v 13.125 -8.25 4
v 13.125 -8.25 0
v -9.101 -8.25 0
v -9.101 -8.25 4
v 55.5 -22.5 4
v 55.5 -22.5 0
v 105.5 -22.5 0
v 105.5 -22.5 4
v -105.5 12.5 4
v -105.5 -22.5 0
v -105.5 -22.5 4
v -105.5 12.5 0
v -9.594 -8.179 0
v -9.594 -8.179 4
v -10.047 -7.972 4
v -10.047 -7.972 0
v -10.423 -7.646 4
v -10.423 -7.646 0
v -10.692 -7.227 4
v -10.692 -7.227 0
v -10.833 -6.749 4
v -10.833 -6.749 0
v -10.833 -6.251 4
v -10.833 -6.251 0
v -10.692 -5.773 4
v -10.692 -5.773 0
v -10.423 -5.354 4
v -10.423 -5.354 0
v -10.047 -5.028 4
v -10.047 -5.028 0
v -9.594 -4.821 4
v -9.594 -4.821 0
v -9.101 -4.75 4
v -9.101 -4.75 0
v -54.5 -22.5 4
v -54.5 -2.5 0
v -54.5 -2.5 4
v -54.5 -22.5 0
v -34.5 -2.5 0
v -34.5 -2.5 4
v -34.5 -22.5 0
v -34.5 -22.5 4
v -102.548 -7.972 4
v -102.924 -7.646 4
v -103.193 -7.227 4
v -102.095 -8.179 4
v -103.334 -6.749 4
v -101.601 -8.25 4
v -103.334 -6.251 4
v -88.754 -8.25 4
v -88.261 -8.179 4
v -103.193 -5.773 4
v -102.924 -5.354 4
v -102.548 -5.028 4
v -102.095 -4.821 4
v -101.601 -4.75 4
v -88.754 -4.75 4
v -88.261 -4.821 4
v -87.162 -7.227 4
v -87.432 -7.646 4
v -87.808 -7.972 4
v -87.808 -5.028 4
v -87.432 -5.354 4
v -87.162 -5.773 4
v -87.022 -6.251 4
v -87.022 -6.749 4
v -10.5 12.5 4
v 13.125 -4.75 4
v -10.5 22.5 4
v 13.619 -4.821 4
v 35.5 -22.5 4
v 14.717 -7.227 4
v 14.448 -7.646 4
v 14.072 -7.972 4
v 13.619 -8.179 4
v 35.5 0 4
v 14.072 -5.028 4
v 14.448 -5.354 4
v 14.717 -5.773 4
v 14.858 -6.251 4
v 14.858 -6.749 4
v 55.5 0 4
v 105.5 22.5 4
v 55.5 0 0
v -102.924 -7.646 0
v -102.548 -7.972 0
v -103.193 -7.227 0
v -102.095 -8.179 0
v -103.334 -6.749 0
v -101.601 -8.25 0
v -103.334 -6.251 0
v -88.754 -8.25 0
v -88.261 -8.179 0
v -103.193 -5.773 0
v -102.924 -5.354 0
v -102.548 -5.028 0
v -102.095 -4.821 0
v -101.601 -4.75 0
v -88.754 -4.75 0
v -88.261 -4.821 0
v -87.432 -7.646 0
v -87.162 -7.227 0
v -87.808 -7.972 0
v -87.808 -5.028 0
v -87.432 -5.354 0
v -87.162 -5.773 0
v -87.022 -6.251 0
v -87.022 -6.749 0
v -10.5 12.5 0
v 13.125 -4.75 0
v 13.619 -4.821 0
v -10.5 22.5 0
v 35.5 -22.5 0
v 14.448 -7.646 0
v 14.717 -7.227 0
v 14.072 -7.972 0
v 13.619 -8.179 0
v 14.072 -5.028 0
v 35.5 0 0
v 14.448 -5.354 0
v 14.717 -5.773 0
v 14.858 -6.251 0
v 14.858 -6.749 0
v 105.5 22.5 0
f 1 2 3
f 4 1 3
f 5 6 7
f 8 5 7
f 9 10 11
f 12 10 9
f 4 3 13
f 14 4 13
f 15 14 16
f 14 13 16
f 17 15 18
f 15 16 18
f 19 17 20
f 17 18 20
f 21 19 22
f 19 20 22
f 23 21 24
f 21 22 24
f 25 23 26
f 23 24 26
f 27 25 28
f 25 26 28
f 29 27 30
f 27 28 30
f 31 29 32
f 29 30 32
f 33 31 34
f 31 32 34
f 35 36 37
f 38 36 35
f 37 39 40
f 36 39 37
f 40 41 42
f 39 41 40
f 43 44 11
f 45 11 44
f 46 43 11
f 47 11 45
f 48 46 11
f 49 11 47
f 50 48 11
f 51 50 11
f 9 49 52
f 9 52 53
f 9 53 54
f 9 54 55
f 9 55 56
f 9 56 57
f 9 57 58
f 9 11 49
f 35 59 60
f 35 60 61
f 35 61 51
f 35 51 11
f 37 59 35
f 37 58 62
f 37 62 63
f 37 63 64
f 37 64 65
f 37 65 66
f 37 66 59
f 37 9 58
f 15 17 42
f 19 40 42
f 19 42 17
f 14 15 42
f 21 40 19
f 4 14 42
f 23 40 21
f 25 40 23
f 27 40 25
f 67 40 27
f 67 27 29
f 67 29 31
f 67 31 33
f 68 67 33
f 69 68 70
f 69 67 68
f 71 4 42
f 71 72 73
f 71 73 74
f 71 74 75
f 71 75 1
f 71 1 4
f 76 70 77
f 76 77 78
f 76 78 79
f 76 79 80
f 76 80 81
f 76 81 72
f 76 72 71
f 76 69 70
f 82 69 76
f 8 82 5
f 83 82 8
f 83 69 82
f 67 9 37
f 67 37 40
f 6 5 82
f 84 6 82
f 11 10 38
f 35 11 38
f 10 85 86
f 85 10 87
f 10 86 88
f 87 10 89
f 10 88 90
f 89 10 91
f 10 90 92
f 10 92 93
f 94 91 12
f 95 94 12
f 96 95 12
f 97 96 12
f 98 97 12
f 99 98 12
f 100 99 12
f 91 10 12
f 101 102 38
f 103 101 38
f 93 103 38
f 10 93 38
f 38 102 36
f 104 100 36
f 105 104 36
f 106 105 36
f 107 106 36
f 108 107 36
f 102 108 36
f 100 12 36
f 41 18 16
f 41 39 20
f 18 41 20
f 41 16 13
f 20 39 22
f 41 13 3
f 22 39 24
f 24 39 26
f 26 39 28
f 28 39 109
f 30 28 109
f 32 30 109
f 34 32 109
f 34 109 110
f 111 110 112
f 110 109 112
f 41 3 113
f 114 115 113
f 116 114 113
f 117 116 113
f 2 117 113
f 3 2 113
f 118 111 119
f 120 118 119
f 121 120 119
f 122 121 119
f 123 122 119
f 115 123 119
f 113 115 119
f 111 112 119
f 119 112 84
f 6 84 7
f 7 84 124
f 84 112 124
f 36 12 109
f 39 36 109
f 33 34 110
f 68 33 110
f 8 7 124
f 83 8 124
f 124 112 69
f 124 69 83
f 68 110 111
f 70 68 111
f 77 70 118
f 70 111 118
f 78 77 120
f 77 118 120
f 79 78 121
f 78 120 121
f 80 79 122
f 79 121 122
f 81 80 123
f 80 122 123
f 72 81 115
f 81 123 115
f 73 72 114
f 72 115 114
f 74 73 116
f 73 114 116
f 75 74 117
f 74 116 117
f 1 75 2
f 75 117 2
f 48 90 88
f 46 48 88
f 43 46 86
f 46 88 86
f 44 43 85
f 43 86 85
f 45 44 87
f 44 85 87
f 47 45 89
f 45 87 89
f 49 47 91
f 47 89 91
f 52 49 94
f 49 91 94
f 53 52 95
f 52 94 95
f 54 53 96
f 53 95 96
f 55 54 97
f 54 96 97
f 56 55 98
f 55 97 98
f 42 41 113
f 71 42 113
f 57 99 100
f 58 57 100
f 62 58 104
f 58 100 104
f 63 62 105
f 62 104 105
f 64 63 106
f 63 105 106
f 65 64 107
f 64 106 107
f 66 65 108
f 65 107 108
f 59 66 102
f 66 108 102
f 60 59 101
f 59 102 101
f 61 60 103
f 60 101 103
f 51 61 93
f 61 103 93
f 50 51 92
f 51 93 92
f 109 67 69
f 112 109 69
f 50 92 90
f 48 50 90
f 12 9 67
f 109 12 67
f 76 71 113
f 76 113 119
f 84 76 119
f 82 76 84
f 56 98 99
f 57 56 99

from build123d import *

# Parameters (mm, degrees)
SKETCH1_W           = 211
SKETCH1_H           = 45
BOSS_EXTRUDE1_DEPTH = 4
CUT_EXTRUDE1_REACH  = 109.947
SKETCH2_W           = 95
SKETCH2_H           = 10
CUT_EXTRUDE2_REACH  = 109.947
SKETCH3_R           = 4.5
SKETCH3_W           = 20
SKETCH3_H           = 22.5
CUT_EXTRUDE3_DEPTH  = 4
CUT_EXTRUDE4_DEPTH  = 4
SKETCH7_R           = 5.771912947
CUT_EXTRUDE6_DEPTH  = 108.94674613
CUT_EXTRUDE7_REACH  = 109.947


with BuildPart() as part:
    # Sketch1 → Boss-Extrude1 (new body)
    with BuildSketch(Plane.XY):
        Rectangle(SKETCH1_W, SKETCH1_H)
    extrude(amount=BOSS_EXTRUDE1_DEPTH)

    # Sketch2 → Cut-Extrude1 (cut, up to next)
    with BuildSketch(Plane.XY.offset(4), mode=Mode.PRIVATE) as cut_extrude1_sk1:
        with Locations((-58, 17.5)):
            Rectangle(SKETCH2_W, SKETCH2_H)
    cut_extrude1_tool1 = extrude(cut_extrude1_sk1.sketch, amount=-CUT_EXTRUDE1_REACH, mode=Mode.PRIVATE) & part.part
    add(cut_extrude1_tool1.solids().sort_by_distance((-58, 17.5, 4))[0], mode=Mode.SUBTRACT)

    # Sketch3 → Cut-Extrude2 (cut, up to next)
    with BuildSketch(Plane.XY.offset(4), mode=Mode.PRIVATE) as cut_extrude2_sk1:
        with Locations((-44.5, -10.5)):
            Circle(SKETCH3_R)
    cut_extrude2_tool1 = extrude(cut_extrude2_sk1.sketch, amount=-CUT_EXTRUDE2_REACH, mode=Mode.PRIVATE) & part.part
    # Sketch3 → Cut-Extrude2 (cut, up to next)
    with BuildSketch(Plane.XY.offset(4), mode=Mode.PRIVATE) as cut_extrude2_sk2:
        with Locations((45.5, -11.25)):
            Rectangle(SKETCH3_W, SKETCH3_H)
        with Locations((45.5, -10.5)):
            Circle(SKETCH3_R, mode=Mode.SUBTRACT)
    cut_extrude2_tool2 = extrude(cut_extrude2_sk2.sketch, amount=-CUT_EXTRUDE2_REACH, mode=Mode.PRIVATE) & part.part
    add(cut_extrude2_tool1.solids().sort_by_distance((-44.5, -10.5, 4))[0], mode=Mode.SUBTRACT)
    add(cut_extrude2_tool2.solids().sort_by_distance((55.19896, -11.25, 4))[0], mode=Mode.SUBTRACT)


with BuildPart() as cut_extrude2_piece_1:
    # of the separate pieces the step leaves, piece 1, a body of its own (cut_extrude2_pieces)
    add(part.part.solids().sort_by_distance((-105.5, -22.5, 0))[0])

    # Sketch4 → Cut-Extrude3 (cut)
    with BuildSketch(Plane(origin=(0, 0, 0), x_dir=(-1, 0, 0), z_dir=(0, 0, -1))):
        Polygon((44.5, -22.5), (34.5, -22.5), (34.5, -2.5), (54.5, -2.5), (54.5, -22.5), align=None)
    extrude(amount=-CUT_EXTRUDE3_DEPTH, mode=Mode.SUBTRACT)

    # Sketch5 → Cut-Extrude4 (cut)
    with BuildSketch(Plane(origin=(0, 0, 0), x_dir=(-1, 0, 0), z_dir=(0, 0, -1))):
        with BuildLine():
            Line((101.601478709, -4.75), (88.754183798, -4.75))
            ThreePointArc((88.754183798, -4.75), (87.004183798, -6.5), (88.754183798, -8.25))
            Line((88.754183798, -8.25), (101.601478709, -8.25))
            ThreePointArc((101.601478709, -8.25), (103.351478709, -6.5), (101.601478709, -4.75))
        make_face()
    extrude(amount=-CUT_EXTRUDE4_DEPTH, mode=Mode.SUBTRACT)

    # Sketch8 → Cut-Extrude7 (cut, up to next)
    with BuildSketch(Plane(origin=(0, 0, 0), x_dir=(-1, 0, 0), z_dir=(0, 0, -1)), mode=Mode.PRIVATE) as cut_extrude7_sk1:
        with BuildLine():
            Line((-13.125491326, -8.25), (9.100552063, -8.25))
            ThreePointArc((9.100552063, -8.25), (10.850552063, -6.5), (9.100552063, -4.75))
            Line((9.100552063, -4.75), (-3.792824267, -4.75))
            Line((-3.792824267, -4.75), (-13.125491326, -4.75))
            ThreePointArc((-13.125491326, -4.75), (-14.875491326, -6.5), (-13.125491326, -8.25))
        make_face()
    cut_extrude7_tool1 = extrude(cut_extrude7_sk1.sketch, amount=-CUT_EXTRUDE7_REACH, mode=Mode.PRIVATE) & cut_extrude2_piece_1.part
    add(cut_extrude7_tool1.solids().sort_by_distance((2.01247, -6.5, 0))[0], mode=Mode.SUBTRACT)


with BuildPart() as cut_extrude2_piece_2:
    # of the separate pieces the step leaves, piece 2, a body of its own (cut_extrude2_pieces)
    add(part.part.solids().sort_by_distance((50, -10.5, 0))[0])

    # Sketch7 → Cut-Extrude6 (cut, through all)
    with BuildSketch(Plane(origin=(0, 0, 0), x_dir=(-1, 0, 0), z_dir=(0, 0, -1))):
        with Locations((-45.5, -10.5)):
            Circle(SKETCH7_R)
    extrude(amount=-CUT_EXTRUDE6_DEPTH, mode=Mode.SUBTRACT)


solid = cut_extrude2_piece_1.part
